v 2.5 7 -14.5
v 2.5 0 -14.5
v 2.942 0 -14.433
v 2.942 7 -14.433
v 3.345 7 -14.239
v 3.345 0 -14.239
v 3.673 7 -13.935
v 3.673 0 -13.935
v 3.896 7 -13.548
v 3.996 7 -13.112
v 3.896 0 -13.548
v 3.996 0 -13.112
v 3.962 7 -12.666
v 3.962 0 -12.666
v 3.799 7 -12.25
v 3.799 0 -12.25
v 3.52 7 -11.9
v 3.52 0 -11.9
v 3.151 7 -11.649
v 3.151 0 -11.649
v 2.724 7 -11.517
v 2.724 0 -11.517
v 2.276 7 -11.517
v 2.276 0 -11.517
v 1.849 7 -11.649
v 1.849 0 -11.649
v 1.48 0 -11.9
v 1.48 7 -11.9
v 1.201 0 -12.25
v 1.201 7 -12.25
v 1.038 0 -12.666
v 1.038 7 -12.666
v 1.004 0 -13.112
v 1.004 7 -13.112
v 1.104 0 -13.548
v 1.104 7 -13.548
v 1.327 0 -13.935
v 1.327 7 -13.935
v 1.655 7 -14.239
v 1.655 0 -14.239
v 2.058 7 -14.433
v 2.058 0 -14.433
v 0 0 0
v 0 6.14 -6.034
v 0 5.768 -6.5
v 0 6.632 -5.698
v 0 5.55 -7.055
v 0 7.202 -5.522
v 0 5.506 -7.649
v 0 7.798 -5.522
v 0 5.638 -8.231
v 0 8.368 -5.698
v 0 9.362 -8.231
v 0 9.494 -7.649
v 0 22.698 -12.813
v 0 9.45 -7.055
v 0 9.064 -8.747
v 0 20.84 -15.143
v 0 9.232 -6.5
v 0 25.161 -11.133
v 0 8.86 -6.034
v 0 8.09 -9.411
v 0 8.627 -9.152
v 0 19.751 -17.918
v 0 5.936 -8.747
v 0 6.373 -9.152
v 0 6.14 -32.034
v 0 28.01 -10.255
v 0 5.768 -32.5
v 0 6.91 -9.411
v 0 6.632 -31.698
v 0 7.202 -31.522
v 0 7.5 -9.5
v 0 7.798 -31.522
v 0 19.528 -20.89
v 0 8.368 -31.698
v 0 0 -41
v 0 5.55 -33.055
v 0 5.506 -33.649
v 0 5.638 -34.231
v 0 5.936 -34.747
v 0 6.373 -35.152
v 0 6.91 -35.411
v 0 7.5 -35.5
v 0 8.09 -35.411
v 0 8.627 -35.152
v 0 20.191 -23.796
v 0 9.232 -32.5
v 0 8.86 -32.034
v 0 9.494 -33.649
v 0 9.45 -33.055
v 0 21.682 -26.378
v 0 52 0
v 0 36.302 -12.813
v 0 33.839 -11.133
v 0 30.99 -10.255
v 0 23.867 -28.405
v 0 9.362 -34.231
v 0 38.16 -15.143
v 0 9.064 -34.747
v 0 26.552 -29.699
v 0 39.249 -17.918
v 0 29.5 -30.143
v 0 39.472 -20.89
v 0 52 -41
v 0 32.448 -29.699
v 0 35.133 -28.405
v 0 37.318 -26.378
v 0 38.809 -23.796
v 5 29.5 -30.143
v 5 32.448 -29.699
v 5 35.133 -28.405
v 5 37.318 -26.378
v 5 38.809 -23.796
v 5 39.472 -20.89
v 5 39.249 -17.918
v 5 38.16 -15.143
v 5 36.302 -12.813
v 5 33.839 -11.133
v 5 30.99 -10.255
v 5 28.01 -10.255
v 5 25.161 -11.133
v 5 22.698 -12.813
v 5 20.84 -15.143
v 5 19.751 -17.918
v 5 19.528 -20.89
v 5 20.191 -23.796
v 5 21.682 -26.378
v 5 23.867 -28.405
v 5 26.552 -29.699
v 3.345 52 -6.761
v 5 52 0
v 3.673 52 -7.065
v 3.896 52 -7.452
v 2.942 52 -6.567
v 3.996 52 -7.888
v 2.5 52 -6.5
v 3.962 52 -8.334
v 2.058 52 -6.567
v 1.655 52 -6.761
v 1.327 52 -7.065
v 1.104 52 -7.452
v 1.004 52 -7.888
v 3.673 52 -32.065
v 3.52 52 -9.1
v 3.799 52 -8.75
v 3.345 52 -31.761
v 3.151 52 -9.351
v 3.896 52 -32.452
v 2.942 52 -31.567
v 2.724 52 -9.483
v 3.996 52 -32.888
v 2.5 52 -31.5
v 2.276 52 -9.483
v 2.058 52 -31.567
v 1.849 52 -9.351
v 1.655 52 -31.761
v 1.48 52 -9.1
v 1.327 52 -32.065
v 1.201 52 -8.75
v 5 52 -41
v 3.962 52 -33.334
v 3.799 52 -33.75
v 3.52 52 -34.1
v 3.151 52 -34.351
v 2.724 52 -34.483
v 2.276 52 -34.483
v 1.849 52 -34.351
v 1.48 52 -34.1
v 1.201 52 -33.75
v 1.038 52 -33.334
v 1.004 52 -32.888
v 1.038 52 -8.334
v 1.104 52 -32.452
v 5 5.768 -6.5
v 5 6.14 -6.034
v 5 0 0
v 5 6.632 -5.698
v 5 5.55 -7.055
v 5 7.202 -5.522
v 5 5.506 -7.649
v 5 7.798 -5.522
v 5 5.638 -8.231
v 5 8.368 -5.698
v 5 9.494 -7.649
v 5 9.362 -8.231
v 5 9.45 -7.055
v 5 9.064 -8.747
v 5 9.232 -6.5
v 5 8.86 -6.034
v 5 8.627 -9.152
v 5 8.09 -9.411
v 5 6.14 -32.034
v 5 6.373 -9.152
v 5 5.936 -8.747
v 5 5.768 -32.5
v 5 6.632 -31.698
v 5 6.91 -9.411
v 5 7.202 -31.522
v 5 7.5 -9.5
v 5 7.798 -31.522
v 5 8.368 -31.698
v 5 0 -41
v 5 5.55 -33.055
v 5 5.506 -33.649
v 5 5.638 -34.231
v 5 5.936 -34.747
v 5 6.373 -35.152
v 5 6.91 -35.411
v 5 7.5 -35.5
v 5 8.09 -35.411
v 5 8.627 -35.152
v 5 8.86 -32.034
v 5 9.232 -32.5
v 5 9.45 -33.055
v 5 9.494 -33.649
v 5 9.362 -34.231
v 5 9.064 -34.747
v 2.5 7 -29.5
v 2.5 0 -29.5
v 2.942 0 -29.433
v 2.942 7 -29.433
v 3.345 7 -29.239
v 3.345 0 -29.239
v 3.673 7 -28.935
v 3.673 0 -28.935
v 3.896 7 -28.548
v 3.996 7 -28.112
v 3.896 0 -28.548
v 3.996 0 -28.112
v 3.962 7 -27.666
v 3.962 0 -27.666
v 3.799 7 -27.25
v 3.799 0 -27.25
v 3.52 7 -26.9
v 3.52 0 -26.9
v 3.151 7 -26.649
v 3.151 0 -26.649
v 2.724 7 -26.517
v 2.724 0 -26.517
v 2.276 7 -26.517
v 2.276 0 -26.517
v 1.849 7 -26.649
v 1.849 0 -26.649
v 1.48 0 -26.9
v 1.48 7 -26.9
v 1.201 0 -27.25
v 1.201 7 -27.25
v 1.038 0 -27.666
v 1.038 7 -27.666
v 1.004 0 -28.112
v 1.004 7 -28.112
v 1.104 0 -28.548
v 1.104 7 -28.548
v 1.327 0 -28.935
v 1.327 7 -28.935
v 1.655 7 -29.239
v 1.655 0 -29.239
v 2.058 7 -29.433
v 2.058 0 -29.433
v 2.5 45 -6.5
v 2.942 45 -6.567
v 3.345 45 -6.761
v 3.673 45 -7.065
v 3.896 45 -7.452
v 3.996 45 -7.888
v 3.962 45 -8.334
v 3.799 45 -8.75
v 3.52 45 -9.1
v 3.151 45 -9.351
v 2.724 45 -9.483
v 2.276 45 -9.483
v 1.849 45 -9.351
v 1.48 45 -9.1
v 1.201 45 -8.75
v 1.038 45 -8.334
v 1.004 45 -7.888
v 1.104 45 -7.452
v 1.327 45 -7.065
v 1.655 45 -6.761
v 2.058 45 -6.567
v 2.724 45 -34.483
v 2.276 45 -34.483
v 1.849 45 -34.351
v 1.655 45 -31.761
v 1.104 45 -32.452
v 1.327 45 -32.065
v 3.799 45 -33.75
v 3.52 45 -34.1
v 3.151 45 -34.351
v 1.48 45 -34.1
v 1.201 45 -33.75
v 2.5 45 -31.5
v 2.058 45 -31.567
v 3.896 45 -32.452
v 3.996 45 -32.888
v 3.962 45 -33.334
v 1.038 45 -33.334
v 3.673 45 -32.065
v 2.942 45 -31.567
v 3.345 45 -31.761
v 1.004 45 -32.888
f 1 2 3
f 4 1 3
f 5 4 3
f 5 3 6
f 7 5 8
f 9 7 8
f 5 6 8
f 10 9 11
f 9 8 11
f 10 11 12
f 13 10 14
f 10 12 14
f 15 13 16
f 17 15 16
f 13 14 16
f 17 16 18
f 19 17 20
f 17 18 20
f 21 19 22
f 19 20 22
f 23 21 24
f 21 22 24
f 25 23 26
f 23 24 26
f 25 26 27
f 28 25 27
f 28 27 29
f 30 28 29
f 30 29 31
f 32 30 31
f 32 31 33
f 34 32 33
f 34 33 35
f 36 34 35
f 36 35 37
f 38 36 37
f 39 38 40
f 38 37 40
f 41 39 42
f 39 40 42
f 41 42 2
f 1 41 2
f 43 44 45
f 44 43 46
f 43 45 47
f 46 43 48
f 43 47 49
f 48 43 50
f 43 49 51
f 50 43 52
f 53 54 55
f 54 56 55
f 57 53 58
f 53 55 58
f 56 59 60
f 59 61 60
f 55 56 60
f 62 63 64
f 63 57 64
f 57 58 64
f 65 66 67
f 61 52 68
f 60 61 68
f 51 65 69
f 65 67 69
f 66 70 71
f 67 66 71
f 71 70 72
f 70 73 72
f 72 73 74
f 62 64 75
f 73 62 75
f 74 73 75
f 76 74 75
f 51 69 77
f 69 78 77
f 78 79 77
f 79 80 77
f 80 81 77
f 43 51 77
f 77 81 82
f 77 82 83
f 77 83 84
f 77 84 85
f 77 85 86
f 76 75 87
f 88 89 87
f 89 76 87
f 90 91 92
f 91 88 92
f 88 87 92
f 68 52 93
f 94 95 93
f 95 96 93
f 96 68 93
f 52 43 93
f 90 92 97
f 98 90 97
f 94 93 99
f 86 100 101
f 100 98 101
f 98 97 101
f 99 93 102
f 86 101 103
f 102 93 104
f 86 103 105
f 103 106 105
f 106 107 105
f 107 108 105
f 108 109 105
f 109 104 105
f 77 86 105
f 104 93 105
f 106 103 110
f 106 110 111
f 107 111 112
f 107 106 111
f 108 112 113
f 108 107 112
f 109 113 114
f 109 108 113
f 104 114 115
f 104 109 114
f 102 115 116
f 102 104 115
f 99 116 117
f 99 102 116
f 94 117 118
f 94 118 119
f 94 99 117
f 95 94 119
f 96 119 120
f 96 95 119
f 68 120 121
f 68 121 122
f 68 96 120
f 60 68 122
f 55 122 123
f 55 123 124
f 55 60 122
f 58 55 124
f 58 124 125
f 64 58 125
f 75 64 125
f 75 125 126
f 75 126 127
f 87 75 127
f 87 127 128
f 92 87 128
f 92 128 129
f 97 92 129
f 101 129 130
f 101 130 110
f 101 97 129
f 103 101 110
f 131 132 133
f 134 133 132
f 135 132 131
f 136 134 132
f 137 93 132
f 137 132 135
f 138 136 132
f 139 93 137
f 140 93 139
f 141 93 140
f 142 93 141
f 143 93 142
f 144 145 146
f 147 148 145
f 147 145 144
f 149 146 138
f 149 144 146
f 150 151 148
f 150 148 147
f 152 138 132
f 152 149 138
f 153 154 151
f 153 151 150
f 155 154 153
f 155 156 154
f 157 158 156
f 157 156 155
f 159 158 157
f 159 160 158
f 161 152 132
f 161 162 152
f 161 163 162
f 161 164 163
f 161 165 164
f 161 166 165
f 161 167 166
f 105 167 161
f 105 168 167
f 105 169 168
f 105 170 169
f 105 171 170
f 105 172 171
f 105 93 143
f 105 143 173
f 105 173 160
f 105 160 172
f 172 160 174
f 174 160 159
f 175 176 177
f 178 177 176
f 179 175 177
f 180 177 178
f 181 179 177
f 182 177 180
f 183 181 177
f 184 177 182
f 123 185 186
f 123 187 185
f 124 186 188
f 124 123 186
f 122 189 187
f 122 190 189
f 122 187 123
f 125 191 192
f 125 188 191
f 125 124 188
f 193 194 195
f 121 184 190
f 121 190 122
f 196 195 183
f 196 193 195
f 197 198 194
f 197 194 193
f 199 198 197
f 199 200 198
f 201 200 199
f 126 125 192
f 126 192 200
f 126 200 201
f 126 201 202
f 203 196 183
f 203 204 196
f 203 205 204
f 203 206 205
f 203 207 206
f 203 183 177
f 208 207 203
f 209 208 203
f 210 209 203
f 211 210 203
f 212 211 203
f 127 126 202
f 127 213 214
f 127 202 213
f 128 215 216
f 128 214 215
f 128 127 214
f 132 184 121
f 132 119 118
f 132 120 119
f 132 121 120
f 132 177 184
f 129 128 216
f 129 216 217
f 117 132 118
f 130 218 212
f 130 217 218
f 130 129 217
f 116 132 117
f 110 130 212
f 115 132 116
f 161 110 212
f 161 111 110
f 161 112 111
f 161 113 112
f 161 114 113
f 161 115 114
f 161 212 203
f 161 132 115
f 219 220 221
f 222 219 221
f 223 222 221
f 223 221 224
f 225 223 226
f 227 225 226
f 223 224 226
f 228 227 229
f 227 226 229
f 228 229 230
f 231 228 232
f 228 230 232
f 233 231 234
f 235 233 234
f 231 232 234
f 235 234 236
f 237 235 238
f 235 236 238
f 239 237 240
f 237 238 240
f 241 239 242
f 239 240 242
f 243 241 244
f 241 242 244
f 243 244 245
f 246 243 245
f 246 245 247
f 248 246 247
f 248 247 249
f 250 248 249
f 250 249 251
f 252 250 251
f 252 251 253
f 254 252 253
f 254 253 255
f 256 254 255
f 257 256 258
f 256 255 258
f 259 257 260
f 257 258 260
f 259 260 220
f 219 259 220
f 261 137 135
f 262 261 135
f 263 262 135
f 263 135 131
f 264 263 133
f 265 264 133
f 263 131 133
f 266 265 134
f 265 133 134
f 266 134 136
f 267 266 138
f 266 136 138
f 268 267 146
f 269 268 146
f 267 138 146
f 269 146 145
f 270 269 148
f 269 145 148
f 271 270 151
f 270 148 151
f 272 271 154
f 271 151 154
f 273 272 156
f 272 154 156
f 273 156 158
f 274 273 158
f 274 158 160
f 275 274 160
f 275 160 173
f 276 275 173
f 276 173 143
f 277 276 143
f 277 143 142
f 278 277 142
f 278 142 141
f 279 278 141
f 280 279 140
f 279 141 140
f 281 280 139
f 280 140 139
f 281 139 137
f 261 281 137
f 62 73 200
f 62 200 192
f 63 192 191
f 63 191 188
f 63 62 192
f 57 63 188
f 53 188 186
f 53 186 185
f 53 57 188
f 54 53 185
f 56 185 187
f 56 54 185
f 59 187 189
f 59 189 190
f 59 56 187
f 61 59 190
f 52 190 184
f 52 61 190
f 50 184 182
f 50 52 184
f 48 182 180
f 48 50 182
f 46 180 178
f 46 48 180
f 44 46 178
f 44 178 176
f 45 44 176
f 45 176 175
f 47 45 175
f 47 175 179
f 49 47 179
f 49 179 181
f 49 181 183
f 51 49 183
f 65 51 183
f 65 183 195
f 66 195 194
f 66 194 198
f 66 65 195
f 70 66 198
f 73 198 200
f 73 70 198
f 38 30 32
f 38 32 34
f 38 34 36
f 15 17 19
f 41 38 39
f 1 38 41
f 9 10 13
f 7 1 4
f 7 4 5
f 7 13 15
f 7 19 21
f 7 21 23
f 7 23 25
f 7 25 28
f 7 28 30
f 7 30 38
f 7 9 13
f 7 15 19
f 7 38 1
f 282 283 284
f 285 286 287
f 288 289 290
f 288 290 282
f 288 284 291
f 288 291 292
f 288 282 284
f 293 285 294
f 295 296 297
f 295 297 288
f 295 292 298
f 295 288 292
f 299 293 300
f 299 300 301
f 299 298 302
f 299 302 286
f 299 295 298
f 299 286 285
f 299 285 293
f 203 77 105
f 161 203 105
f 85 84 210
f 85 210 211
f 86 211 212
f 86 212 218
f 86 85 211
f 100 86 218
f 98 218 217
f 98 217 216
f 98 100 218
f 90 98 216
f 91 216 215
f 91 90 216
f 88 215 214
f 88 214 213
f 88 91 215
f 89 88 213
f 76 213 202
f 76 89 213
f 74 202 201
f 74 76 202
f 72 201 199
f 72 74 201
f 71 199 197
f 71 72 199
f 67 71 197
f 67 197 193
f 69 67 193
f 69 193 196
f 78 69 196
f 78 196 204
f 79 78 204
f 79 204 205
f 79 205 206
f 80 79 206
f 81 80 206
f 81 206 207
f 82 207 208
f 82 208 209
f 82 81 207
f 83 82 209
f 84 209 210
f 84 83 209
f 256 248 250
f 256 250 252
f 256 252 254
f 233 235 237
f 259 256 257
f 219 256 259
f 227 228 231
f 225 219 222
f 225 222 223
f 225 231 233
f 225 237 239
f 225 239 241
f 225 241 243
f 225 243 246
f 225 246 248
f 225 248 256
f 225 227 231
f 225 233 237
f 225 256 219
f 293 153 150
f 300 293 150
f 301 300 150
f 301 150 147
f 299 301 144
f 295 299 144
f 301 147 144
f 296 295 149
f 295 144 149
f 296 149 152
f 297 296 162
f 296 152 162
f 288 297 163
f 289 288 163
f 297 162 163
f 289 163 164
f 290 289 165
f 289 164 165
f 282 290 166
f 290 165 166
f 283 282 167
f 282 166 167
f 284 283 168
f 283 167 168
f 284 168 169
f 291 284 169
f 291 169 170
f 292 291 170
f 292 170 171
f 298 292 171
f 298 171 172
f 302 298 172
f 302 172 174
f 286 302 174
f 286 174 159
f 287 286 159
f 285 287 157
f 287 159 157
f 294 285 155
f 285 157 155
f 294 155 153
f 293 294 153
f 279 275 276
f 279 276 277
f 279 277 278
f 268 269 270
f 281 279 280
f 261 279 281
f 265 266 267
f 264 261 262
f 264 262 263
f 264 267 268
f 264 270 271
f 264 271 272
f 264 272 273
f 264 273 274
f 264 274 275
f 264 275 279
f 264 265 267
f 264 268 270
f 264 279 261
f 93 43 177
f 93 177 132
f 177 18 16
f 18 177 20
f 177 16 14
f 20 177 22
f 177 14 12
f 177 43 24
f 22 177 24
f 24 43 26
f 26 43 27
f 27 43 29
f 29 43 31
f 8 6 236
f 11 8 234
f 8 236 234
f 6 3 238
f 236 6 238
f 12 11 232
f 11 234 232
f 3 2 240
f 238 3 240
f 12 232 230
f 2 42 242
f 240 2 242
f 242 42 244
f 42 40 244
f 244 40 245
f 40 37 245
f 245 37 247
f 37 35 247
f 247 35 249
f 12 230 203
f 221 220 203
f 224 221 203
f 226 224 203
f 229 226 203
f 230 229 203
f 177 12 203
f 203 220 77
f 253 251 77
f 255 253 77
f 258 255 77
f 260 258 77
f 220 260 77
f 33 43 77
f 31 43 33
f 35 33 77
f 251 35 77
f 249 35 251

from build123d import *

# Parameters (mm, degrees)
SKETCH1_W           = 41
SKETCH1_H           = 52
SKETCH1_R           = 2
SKETCH1_R_2         = 10
BOSS_EXTRUDE1_DEPTH = 5
SKETCH2_R           = 1.5
CUT_EXTRUDE1_DEPTH  = 7
SKETCH3_R           = 1.5
CUT_EXTRUDE2_DEPTH  = 7


with BuildPart() as part:
    # Sketch1 → Boss-Extrude1 (new body)
    with BuildSketch(Plane(origin=(0, 0, 0), x_dir=(0, 0, -1), z_dir=(1, 0, 0))):
        with Locations((20.5, 26)):
            Rectangle(SKETCH1_W, SKETCH1_H)
        with Locations((7.5, 7.5)):
            Circle(SKETCH1_R, mode=Mode.SUBTRACT)
        with Locations((33.5, 7.5)):
            Circle(SKETCH1_R, mode=Mode.SUBTRACT)
        with Locations((20.143024766, 29.5)):
            Circle(SKETCH1_R_2, mode=Mode.SUBTRACT)
    extrude(amount=BOSS_EXTRUDE1_DEPTH)

    # Sketch2 → Cut-Extrude1 (cut)
    with BuildSketch(Plane(origin=(0, 0, 0), x_dir=(-1, 0, 0), z_dir=(0, -1, 0))):
        with Locations(Location((-2.5, 13, 0), (0, 0, 90))):
            Circle(SKETCH2_R)
        with Locations(Location((-2.5, 28, 0), (0, 0, 90))):
            Circle(SKETCH2_R)
    extrude(amount=-CUT_EXTRUDE1_DEPTH, mode=Mode.SUBTRACT)

    # Sketch3 → Cut-Extrude2 (cut)
    with BuildSketch(Plane(origin=(0, 52, 0), x_dir=(1, 0, 0), z_dir=(0, 1, 0))):
        with Locations(Location((2.5, 8, 0), (0, 0, 270))):
            Circle(SKETCH3_R)
        with Locations(Location((2.5, 33, 0), (0, 0, 270))):
            Circle(SKETCH3_R)
    extrude(amount=-CUT_EXTRUDE2_DEPTH, mode=Mode.SUBTRACT)


solid = part.part
